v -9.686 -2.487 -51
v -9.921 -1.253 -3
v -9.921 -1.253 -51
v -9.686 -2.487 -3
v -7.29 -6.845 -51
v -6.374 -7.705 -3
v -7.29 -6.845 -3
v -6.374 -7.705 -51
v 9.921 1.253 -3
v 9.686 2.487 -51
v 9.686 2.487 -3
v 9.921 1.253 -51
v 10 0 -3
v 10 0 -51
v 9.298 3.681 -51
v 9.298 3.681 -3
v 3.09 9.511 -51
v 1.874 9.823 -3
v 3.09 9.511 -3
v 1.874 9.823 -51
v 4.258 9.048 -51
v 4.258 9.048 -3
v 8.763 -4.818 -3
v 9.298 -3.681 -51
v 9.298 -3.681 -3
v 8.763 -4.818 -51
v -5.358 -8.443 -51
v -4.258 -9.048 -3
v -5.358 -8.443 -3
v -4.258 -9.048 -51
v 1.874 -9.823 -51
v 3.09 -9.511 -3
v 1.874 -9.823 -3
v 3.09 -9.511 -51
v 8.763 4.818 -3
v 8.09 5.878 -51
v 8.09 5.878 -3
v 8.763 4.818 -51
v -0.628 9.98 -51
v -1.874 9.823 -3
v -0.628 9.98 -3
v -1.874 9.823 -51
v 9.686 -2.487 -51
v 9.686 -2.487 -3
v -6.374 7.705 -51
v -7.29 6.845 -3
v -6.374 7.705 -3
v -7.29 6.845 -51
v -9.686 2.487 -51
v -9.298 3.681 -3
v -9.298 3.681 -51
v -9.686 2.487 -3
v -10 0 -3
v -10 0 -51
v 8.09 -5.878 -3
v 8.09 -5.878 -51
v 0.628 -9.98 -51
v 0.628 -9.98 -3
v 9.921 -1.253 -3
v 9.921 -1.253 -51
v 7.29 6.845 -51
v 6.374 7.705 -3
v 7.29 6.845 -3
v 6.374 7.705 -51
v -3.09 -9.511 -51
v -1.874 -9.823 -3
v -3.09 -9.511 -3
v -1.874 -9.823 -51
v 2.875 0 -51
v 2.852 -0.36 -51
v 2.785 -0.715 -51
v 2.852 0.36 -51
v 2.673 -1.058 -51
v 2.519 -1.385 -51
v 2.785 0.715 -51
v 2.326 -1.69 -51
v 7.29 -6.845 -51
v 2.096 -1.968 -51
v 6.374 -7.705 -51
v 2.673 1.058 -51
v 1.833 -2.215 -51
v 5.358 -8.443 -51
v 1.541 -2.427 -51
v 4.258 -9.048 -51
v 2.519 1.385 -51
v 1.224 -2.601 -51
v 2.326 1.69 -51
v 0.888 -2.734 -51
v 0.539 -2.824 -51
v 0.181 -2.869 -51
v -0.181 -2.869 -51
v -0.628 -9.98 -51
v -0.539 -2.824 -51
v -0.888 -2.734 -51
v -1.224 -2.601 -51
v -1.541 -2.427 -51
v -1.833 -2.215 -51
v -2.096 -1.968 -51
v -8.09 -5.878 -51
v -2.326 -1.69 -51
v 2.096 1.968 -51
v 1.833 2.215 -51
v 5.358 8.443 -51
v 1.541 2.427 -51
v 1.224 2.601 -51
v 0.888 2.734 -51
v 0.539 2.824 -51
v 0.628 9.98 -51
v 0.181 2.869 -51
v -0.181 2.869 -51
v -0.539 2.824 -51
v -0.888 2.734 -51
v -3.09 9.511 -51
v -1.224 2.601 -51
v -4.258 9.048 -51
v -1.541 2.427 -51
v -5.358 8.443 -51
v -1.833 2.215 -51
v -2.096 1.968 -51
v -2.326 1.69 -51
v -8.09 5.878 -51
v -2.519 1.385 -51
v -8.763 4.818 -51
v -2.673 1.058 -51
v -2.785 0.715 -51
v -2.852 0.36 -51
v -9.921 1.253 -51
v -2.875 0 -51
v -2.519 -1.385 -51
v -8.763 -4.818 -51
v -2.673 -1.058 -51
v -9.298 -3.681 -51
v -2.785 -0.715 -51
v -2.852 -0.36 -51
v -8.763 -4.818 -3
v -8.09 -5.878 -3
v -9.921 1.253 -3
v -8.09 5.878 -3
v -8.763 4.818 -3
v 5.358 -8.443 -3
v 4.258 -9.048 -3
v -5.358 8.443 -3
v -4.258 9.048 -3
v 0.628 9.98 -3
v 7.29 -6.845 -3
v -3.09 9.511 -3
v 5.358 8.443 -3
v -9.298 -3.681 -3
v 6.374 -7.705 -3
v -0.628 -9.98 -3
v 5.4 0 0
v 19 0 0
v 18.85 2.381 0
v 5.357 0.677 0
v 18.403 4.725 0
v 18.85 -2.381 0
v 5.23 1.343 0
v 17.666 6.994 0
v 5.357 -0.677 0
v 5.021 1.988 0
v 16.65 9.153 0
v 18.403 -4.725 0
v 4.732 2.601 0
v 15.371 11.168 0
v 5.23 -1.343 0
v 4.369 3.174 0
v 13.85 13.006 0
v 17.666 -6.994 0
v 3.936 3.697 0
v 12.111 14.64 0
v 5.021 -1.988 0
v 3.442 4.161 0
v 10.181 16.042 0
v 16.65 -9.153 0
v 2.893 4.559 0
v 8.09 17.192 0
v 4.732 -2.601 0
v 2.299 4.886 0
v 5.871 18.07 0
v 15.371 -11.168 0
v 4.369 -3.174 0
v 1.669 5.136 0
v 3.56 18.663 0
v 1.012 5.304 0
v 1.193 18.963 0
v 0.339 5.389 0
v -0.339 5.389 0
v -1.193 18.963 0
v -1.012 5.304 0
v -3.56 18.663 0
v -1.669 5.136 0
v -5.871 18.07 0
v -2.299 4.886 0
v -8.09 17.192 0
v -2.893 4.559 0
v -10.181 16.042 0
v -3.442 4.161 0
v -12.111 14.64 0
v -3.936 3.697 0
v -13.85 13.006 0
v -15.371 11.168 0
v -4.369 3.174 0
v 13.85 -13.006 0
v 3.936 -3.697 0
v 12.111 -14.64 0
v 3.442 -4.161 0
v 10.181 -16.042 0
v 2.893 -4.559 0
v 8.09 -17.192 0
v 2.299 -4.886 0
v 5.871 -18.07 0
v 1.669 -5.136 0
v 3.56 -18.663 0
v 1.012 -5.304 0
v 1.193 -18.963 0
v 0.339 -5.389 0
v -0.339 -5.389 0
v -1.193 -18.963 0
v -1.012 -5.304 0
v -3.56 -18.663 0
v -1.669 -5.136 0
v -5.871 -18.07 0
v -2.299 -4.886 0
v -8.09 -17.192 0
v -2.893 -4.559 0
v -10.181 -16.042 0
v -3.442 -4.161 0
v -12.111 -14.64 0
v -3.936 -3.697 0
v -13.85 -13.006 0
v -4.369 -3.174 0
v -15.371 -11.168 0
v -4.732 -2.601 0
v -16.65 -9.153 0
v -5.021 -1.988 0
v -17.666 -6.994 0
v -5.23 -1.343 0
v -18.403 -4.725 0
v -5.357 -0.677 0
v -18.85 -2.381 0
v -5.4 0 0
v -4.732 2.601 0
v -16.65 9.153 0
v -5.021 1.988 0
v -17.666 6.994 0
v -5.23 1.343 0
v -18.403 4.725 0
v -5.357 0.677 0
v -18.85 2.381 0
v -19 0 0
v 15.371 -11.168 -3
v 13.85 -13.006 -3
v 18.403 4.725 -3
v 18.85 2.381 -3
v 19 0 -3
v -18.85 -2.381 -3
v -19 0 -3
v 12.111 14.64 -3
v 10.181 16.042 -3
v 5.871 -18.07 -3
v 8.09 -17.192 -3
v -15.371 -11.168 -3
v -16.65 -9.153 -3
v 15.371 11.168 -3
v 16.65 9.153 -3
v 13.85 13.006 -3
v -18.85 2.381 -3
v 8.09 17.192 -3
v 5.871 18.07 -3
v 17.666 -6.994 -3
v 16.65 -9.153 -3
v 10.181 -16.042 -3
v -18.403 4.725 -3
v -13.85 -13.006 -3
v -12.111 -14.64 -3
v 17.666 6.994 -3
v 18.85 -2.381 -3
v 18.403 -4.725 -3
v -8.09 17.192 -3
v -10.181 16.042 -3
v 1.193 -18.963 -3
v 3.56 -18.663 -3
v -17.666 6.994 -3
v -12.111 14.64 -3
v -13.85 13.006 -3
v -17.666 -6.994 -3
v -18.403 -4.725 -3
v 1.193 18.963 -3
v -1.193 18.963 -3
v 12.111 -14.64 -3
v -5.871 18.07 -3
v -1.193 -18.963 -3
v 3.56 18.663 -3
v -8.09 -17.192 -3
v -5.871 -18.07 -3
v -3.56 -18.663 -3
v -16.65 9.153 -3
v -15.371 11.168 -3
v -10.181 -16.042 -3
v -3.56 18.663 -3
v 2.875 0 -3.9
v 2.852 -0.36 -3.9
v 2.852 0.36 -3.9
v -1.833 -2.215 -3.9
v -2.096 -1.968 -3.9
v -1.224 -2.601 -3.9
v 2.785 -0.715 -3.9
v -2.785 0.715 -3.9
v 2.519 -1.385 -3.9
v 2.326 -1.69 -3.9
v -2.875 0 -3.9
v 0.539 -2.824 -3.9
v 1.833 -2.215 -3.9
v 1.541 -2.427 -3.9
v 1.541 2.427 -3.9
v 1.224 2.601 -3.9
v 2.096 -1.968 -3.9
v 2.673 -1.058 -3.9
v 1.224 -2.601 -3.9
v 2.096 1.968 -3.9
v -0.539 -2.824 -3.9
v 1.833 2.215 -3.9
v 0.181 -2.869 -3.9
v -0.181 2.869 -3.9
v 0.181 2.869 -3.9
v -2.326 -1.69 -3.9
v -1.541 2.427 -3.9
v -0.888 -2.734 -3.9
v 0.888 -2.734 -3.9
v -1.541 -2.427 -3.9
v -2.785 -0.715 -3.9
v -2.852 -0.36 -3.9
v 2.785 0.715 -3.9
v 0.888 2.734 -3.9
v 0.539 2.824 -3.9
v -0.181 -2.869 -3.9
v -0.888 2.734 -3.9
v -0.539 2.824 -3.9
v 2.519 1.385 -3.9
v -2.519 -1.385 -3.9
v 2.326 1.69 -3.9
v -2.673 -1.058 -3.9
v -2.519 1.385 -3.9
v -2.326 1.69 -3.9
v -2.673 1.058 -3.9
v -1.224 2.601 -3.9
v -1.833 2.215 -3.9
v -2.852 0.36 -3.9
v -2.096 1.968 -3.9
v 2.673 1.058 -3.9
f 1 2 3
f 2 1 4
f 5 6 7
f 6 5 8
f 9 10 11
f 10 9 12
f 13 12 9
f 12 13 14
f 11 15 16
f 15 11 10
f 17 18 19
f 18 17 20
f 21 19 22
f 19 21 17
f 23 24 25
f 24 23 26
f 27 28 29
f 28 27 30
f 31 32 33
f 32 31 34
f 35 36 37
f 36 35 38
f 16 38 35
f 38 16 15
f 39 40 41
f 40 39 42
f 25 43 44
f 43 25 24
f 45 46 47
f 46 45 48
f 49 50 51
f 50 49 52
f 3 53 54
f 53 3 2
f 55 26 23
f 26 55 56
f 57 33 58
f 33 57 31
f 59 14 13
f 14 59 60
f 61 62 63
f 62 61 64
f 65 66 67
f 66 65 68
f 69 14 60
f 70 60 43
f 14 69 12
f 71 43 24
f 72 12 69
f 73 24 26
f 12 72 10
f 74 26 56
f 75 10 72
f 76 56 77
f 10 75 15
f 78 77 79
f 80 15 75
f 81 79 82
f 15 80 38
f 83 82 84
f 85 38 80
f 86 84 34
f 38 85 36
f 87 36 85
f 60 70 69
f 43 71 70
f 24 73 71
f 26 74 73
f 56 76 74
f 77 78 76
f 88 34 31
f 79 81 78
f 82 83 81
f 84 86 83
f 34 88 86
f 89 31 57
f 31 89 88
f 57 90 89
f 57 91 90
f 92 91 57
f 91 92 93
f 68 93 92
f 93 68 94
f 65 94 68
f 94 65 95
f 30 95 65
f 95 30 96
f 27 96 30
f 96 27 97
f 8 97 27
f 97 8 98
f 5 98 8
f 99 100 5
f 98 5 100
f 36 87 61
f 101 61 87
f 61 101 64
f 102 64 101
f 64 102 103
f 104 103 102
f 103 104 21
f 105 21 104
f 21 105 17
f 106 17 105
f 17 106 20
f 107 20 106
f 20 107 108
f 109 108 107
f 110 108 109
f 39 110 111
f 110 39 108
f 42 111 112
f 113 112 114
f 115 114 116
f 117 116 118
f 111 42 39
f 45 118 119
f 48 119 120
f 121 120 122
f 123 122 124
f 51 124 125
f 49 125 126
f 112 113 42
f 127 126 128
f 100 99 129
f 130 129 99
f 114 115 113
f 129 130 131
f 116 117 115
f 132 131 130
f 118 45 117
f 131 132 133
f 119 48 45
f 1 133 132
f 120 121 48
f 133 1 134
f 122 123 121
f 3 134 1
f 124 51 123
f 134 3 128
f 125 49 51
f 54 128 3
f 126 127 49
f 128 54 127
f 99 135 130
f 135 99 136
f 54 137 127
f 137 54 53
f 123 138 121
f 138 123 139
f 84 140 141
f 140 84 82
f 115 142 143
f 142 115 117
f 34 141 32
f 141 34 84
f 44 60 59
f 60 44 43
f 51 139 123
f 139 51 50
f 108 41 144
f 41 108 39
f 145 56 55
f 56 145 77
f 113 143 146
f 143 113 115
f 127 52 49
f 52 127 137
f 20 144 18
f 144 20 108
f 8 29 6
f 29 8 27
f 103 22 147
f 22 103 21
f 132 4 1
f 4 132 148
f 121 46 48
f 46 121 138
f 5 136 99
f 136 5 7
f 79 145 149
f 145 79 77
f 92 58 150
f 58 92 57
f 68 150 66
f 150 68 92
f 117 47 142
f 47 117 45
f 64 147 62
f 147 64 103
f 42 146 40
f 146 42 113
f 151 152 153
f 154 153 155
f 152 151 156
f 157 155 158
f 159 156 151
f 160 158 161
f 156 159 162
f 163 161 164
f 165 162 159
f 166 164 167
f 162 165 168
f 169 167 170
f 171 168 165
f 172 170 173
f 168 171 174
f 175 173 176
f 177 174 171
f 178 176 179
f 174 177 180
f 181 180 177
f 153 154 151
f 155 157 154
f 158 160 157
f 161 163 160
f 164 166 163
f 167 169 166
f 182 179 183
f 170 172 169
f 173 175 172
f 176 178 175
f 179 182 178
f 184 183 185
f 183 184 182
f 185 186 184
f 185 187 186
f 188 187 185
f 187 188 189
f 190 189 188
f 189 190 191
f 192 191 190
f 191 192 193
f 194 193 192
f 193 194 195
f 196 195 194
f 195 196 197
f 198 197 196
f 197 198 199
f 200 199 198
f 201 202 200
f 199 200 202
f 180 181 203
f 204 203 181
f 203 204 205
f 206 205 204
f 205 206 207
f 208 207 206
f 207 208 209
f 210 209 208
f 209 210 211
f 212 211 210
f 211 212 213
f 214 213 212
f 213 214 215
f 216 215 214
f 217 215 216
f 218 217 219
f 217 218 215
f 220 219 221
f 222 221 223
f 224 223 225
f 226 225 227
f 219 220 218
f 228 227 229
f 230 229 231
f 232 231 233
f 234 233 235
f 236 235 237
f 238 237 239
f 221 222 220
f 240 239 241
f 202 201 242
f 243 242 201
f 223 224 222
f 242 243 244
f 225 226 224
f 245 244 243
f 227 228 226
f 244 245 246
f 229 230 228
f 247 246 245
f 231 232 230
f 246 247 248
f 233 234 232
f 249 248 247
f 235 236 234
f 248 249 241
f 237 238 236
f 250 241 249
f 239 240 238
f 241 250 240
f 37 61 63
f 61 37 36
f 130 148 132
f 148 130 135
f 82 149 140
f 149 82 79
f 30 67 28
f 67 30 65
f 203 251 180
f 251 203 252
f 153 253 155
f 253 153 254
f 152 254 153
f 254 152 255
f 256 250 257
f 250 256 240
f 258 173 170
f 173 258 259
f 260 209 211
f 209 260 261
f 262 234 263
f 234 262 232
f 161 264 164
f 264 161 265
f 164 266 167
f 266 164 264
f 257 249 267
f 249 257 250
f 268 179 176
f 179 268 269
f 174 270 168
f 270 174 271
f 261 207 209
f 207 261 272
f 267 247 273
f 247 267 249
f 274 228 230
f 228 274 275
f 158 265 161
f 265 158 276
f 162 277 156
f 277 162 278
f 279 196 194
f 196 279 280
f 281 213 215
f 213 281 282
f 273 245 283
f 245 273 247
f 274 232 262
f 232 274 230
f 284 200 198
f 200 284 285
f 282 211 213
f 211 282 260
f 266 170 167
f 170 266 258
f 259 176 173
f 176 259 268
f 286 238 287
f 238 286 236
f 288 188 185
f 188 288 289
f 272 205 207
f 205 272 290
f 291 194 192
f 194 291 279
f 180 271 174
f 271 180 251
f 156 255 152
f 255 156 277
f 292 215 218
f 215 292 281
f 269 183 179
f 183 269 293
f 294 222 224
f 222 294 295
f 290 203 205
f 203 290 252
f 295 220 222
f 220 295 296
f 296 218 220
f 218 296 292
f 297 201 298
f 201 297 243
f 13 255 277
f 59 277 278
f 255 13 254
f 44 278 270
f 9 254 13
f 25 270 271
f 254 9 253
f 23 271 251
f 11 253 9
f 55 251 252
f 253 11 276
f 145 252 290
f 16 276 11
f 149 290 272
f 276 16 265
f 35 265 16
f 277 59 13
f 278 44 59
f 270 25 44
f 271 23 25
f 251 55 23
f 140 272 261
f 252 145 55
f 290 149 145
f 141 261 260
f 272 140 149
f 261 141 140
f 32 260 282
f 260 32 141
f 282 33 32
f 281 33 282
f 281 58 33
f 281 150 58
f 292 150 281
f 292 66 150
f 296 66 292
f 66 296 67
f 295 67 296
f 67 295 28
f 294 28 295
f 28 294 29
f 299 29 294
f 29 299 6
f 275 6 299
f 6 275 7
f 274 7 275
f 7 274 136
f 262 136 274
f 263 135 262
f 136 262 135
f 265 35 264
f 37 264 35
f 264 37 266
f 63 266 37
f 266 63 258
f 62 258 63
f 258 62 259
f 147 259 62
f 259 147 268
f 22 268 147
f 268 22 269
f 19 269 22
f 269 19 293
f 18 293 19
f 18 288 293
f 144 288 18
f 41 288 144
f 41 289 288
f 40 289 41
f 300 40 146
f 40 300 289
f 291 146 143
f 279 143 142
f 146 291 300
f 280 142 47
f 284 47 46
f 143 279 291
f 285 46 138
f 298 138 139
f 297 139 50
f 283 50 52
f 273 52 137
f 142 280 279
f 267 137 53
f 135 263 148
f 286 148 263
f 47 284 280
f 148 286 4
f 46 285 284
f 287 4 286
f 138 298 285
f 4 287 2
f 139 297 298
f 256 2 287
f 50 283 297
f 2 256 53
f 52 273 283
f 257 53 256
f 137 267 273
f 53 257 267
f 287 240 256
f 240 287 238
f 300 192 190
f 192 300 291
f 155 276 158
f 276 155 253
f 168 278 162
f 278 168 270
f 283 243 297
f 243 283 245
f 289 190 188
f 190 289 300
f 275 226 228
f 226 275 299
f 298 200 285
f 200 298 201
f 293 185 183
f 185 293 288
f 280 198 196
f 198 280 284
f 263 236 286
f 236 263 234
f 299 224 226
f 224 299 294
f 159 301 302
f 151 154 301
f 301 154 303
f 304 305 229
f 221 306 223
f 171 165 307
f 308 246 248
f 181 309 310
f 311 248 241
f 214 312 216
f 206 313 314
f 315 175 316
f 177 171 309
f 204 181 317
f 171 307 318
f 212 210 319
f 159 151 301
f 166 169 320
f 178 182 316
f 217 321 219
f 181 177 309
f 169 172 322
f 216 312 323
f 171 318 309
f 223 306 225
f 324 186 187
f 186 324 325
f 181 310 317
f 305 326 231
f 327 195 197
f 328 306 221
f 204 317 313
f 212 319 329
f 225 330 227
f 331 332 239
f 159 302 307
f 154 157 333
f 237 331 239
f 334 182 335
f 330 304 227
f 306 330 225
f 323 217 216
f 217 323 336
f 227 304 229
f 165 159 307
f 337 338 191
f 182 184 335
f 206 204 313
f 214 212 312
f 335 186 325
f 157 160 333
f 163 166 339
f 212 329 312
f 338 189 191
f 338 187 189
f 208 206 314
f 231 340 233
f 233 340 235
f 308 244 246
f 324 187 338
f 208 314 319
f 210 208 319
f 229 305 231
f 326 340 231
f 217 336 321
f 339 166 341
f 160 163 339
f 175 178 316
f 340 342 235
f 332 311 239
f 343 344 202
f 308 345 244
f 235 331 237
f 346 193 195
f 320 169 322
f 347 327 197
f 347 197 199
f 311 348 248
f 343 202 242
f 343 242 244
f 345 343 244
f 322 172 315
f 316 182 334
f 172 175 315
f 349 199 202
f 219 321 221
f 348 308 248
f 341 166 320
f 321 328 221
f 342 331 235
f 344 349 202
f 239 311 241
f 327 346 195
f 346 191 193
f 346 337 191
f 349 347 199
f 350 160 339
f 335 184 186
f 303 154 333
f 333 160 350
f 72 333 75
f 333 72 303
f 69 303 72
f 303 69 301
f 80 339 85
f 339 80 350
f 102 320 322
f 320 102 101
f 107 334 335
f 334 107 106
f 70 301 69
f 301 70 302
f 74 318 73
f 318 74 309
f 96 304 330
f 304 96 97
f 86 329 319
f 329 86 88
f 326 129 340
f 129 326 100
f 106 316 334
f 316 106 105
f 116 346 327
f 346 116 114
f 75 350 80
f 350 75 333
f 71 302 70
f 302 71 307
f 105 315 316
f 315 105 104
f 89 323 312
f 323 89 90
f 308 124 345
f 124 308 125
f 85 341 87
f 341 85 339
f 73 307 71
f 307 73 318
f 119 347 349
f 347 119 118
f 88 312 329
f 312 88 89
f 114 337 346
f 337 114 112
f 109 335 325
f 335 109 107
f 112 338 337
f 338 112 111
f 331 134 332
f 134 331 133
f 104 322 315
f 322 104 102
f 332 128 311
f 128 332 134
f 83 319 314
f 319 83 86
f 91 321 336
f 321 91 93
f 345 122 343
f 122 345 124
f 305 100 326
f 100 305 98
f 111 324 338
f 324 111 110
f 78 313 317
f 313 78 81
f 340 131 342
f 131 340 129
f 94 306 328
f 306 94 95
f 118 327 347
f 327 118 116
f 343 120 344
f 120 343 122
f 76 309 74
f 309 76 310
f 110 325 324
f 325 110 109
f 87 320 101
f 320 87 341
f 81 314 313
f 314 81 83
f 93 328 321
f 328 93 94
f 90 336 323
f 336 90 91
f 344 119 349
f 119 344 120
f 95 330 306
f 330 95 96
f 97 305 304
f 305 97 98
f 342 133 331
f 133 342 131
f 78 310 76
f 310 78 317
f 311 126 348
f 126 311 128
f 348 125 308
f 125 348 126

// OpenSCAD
$fn = 50;


difference() {
	union() {
		translate(v = [0, 0, -51.0000000000]) {
			cylinder(h = 51, r = 10.0000000000);
		}
		translate(v = [0, 0, -3.0000000000]) {
			cylinder(h = 3, r = 19.0000000000);
		}
	}
	union() {
		translate(v = [0, 0, 0]) {
			rotate(a = [0, 0, 0]) {
				difference() {
					union() {
						#translate(v = [0, 0, -51.0000000000]) {
							cylinder(h = 51, r = 2.6000000000);
						}
						#translate(v = [0, 0, -3.9000000000]) {
							cylinder(h = 3.9000000000, r1 = 2.8750000000, r2 = 5.4000000000);
						}
						#translate(v = [0, 0, -51.0000000000]) {
							cylinder(h = 51, r = 2.8750000000);
						}
						#translate(v = [0, 0, -51.0000000000]) {
							cylinder(h = 51, r = 2.6000000000);
						}
					}
					union();
				}
			}
		}
	}
}
